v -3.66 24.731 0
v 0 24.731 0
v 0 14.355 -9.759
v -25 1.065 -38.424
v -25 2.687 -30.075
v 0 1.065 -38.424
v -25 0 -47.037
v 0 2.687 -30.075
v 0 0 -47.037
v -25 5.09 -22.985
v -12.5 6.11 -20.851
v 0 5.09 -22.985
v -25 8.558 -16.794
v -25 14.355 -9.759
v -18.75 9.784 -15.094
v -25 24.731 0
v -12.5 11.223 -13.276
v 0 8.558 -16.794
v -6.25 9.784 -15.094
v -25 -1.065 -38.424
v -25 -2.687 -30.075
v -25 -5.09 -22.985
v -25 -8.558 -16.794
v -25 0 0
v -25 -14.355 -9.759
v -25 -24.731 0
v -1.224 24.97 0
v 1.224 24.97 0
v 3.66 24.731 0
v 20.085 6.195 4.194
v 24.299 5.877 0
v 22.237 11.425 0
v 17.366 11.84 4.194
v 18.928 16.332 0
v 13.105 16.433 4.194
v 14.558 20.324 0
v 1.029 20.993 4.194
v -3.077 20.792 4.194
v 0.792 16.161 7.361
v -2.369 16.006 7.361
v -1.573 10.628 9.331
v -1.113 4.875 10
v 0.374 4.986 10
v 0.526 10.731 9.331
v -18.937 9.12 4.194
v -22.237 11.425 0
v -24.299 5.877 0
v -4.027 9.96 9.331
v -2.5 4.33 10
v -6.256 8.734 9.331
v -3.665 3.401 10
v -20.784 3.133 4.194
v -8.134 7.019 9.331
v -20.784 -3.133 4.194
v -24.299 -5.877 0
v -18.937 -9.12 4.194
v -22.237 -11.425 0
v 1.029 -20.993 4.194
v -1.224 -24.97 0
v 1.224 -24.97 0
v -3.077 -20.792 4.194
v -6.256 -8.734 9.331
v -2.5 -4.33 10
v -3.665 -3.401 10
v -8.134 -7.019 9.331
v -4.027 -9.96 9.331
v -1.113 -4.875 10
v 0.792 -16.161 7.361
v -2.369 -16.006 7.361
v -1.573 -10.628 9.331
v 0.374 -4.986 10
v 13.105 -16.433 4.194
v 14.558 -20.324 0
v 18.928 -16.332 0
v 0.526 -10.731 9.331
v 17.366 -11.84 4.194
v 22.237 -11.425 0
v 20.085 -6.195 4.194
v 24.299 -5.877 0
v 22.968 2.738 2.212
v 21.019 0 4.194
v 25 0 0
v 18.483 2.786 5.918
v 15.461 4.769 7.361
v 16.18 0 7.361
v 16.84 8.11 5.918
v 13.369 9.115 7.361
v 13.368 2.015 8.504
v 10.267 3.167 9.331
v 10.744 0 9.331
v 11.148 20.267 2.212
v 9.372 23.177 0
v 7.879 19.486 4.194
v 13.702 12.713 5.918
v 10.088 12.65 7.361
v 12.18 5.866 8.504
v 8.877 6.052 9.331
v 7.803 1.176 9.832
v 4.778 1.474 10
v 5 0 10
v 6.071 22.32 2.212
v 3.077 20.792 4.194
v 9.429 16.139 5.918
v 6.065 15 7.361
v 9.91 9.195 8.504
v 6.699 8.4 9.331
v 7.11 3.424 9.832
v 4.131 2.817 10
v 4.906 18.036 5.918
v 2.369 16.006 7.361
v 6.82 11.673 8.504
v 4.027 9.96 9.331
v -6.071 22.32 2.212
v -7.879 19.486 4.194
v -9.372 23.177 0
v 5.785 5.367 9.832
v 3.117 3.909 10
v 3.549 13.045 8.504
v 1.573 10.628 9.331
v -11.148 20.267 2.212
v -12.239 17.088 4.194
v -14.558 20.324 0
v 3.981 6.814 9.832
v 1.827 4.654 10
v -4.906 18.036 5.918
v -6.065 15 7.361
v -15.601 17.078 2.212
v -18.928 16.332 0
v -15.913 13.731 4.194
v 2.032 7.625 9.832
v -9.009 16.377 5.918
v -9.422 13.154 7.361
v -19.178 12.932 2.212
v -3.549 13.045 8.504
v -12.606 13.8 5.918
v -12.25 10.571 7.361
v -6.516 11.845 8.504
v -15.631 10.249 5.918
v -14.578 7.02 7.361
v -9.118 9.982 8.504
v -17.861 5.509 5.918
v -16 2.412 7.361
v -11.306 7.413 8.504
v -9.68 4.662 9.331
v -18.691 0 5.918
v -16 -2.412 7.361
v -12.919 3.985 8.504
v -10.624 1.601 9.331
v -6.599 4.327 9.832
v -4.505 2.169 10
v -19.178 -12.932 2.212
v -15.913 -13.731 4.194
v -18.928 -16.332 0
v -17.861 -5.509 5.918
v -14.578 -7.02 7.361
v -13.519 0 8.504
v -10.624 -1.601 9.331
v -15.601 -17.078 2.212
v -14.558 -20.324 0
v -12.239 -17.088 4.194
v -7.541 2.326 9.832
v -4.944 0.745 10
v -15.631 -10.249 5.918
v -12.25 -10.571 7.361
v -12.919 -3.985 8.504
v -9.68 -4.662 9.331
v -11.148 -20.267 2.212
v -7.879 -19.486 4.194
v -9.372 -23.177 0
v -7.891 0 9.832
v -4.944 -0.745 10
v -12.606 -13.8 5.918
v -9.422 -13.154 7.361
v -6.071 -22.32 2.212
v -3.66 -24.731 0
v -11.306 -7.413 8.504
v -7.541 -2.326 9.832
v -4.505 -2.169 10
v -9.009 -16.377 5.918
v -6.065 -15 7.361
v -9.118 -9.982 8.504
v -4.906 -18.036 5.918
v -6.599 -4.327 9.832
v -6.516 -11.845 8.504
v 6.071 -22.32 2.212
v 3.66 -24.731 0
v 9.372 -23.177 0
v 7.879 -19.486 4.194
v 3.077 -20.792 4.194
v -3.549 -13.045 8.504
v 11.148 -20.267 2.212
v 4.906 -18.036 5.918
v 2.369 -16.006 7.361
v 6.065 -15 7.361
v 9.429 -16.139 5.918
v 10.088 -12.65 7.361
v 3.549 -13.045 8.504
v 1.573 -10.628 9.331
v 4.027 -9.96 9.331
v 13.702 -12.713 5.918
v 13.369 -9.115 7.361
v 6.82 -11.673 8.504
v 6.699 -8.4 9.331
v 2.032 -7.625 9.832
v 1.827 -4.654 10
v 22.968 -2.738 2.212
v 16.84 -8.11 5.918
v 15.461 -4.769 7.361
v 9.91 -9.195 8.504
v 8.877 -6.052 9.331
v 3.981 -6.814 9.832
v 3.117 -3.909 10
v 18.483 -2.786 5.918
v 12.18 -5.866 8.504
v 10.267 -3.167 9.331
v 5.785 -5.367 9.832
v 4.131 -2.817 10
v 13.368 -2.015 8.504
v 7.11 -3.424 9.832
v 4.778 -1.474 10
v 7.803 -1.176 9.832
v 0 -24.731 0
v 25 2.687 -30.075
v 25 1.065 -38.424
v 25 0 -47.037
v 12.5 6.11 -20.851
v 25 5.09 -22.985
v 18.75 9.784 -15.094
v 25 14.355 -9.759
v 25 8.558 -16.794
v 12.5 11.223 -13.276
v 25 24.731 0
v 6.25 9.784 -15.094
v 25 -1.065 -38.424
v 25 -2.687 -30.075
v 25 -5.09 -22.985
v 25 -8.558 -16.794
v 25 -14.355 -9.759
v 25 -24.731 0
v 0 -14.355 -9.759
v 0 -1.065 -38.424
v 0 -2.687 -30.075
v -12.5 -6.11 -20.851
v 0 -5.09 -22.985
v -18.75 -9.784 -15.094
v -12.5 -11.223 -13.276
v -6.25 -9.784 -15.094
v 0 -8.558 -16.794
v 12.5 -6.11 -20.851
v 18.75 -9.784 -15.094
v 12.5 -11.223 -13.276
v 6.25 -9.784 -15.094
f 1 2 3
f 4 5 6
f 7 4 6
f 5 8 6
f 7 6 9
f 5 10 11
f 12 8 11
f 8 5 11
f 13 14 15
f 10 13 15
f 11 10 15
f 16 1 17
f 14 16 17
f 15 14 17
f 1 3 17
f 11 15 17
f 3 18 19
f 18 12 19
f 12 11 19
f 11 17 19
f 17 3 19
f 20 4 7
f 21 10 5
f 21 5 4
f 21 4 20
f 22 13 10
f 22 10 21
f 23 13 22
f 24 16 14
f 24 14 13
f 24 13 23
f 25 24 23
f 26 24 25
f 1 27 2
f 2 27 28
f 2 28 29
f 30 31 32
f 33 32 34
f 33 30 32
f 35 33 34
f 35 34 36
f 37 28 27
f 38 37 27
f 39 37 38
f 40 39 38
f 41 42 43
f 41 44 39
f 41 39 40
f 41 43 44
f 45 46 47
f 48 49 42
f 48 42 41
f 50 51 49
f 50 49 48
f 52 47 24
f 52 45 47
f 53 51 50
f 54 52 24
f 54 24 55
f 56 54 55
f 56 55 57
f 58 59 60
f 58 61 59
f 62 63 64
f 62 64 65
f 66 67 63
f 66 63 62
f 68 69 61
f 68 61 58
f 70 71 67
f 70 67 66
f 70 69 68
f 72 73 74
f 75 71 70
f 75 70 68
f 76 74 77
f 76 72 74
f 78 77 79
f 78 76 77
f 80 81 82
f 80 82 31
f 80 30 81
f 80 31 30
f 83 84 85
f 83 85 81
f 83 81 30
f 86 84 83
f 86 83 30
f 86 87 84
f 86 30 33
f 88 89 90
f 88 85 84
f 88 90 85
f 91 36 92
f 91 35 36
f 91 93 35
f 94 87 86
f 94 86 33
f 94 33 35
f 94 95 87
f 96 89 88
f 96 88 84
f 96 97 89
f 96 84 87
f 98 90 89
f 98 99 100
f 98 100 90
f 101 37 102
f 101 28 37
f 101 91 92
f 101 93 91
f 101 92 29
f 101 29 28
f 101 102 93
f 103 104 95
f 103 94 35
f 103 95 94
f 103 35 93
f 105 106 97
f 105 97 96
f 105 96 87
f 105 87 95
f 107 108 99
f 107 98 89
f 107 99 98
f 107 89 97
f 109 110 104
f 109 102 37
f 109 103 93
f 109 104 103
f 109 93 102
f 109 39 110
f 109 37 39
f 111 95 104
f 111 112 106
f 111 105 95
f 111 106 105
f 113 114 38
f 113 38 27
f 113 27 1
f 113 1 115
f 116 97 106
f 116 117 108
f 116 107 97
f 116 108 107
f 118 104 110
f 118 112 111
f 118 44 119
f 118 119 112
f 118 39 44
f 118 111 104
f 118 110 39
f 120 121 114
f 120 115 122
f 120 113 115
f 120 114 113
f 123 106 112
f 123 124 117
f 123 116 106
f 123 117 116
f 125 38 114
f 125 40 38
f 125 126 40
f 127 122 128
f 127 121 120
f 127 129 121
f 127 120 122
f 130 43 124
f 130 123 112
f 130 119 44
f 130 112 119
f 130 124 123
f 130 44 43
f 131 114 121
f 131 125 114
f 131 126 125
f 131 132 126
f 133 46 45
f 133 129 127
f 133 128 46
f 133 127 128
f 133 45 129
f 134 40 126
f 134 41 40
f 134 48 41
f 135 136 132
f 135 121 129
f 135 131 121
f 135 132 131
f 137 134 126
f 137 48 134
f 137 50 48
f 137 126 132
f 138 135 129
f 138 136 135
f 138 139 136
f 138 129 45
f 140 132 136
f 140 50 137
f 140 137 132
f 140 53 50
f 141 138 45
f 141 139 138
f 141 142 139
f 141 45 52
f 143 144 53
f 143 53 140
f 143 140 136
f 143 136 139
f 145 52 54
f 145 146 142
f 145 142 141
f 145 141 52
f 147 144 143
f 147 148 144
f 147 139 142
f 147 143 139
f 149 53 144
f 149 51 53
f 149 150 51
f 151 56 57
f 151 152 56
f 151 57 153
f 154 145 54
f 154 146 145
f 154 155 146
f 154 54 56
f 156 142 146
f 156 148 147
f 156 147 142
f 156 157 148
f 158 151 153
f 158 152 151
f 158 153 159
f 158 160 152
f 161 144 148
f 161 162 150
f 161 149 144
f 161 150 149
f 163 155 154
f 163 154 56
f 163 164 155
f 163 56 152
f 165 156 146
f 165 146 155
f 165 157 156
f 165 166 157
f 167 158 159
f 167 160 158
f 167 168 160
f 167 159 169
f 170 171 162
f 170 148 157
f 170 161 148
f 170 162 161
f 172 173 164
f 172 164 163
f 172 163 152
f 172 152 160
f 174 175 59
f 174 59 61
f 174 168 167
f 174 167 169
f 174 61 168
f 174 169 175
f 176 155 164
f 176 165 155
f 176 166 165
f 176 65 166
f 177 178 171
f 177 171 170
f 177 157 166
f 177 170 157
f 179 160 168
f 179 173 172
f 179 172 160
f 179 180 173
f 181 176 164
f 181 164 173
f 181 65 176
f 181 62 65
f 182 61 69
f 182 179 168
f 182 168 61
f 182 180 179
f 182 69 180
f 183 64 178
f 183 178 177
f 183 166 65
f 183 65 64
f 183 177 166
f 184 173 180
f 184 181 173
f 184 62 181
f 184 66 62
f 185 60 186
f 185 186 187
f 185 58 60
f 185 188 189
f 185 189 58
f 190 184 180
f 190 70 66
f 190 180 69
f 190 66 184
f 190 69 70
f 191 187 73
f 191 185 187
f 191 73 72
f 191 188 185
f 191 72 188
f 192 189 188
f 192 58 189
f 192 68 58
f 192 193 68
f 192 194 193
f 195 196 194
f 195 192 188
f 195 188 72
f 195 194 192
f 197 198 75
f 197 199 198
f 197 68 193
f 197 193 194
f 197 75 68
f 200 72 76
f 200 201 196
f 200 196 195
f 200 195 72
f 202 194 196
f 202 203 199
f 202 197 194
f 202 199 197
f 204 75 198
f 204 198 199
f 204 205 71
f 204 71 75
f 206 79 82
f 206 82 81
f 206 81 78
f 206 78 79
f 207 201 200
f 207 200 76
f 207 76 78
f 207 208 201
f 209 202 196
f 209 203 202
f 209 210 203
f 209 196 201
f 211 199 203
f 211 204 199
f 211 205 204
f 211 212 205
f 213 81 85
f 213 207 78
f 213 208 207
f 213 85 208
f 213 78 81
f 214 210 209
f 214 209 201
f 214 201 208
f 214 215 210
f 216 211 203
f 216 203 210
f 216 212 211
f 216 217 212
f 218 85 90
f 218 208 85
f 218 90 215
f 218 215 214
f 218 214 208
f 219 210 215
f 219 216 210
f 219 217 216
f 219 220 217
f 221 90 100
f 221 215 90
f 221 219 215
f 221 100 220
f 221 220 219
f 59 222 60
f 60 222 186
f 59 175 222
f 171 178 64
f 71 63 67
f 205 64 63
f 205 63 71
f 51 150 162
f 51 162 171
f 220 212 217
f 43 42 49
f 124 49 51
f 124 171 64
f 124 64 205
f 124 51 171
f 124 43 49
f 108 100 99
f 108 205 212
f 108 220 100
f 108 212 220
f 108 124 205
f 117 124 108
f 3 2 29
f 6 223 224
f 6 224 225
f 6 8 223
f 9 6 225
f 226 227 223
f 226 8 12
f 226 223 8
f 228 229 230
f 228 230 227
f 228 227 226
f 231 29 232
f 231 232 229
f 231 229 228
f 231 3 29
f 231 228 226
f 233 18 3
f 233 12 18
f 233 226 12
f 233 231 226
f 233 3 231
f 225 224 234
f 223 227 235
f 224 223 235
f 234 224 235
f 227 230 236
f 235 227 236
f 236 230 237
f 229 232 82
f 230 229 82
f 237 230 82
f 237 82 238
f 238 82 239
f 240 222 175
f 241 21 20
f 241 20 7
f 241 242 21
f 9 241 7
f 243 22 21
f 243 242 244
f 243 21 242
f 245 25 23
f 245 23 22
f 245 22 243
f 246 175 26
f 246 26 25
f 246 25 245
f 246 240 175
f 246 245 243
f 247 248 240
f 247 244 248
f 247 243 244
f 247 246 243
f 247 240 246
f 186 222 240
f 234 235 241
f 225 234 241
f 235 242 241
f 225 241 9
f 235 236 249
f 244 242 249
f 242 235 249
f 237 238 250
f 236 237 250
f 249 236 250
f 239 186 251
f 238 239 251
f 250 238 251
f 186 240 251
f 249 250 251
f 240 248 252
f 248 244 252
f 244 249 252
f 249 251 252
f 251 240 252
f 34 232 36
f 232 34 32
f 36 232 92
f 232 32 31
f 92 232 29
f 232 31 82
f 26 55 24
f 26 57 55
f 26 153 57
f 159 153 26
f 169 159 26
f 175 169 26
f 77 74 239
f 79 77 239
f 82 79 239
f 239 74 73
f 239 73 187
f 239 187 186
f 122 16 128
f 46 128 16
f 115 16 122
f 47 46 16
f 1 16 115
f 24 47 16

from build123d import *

# Parameters (mm, degrees)
F0_R     = 25
F1_DEPTH = 10
F4_DEPTH = 25
F5_DEPTH = 25


# Not quite as in the source:
# - a fillet or chamfer that OpenCascade refuses, or shapes differently, is made with other operations: its cross-section is extruded or revolved along the edge and cut away or added


with BuildPart() as f1:
    # F0 (on Top) → F1 (new body)
    with BuildSketch(Plane.XY):
        Circle(F0_R)
    extrude(amount=F1_DEPTH)

    # F2: fillet of radius 25 on 1 edges, made by hand

    # F2_s1 → F2_t2 (revolve, cut)
    with BuildSketch(Plane.XZ):
        with BuildLine():
            ThreePointArc((25, 0), (16.1803398875, 7.360679775), (5, 10))
            Line((5, 10), (25, 10))
            Line((25, 10), (25, 0))
        make_face()
    revolve(axis=Axis((0, 0, 10), (0, 0, 1)), mode=Mode.SUBTRACT)

    # F3 (on Right) → F4 (join)
    with BuildSketch(Plane.YZ):
        with BuildLine():
            add(Edge.make_bspline(
                [(24.730604142, 0), (17.4811016216, -6.4583238577), (3.1217539474, -19.2505557941), (1.033815633, -37.8348617707), (0, -47.0366403461)],
                knots=[0, 0, 0, 0, 0.5048629426, 1, 1, 1, 1], degree=3))
            Line((24.730604142, 0), (-24.730604142, 0))
            add(Edge.make_bspline(
                [(-24.730604142, 0), (-17.4811016216, -6.4583238577), (-3.1217539474, -19.2505557941), (-1.033815633, -37.8348617707), (0, -47.0366403461)],
                knots=[0, 0, 0, 0, 0.5048629426, 1, 1, 1, 1], degree=3))
        make_face()
    extrude(amount=F4_DEPTH)

    # F5 (add): a face of the model
    f5_faces = [f1.faces().sort_by_distance(p)[0] for p in [
        (0, 0, -11.4252371801),
    ]]
    extrude(f5_faces, amount=F5_DEPTH)


solid = f1.part
